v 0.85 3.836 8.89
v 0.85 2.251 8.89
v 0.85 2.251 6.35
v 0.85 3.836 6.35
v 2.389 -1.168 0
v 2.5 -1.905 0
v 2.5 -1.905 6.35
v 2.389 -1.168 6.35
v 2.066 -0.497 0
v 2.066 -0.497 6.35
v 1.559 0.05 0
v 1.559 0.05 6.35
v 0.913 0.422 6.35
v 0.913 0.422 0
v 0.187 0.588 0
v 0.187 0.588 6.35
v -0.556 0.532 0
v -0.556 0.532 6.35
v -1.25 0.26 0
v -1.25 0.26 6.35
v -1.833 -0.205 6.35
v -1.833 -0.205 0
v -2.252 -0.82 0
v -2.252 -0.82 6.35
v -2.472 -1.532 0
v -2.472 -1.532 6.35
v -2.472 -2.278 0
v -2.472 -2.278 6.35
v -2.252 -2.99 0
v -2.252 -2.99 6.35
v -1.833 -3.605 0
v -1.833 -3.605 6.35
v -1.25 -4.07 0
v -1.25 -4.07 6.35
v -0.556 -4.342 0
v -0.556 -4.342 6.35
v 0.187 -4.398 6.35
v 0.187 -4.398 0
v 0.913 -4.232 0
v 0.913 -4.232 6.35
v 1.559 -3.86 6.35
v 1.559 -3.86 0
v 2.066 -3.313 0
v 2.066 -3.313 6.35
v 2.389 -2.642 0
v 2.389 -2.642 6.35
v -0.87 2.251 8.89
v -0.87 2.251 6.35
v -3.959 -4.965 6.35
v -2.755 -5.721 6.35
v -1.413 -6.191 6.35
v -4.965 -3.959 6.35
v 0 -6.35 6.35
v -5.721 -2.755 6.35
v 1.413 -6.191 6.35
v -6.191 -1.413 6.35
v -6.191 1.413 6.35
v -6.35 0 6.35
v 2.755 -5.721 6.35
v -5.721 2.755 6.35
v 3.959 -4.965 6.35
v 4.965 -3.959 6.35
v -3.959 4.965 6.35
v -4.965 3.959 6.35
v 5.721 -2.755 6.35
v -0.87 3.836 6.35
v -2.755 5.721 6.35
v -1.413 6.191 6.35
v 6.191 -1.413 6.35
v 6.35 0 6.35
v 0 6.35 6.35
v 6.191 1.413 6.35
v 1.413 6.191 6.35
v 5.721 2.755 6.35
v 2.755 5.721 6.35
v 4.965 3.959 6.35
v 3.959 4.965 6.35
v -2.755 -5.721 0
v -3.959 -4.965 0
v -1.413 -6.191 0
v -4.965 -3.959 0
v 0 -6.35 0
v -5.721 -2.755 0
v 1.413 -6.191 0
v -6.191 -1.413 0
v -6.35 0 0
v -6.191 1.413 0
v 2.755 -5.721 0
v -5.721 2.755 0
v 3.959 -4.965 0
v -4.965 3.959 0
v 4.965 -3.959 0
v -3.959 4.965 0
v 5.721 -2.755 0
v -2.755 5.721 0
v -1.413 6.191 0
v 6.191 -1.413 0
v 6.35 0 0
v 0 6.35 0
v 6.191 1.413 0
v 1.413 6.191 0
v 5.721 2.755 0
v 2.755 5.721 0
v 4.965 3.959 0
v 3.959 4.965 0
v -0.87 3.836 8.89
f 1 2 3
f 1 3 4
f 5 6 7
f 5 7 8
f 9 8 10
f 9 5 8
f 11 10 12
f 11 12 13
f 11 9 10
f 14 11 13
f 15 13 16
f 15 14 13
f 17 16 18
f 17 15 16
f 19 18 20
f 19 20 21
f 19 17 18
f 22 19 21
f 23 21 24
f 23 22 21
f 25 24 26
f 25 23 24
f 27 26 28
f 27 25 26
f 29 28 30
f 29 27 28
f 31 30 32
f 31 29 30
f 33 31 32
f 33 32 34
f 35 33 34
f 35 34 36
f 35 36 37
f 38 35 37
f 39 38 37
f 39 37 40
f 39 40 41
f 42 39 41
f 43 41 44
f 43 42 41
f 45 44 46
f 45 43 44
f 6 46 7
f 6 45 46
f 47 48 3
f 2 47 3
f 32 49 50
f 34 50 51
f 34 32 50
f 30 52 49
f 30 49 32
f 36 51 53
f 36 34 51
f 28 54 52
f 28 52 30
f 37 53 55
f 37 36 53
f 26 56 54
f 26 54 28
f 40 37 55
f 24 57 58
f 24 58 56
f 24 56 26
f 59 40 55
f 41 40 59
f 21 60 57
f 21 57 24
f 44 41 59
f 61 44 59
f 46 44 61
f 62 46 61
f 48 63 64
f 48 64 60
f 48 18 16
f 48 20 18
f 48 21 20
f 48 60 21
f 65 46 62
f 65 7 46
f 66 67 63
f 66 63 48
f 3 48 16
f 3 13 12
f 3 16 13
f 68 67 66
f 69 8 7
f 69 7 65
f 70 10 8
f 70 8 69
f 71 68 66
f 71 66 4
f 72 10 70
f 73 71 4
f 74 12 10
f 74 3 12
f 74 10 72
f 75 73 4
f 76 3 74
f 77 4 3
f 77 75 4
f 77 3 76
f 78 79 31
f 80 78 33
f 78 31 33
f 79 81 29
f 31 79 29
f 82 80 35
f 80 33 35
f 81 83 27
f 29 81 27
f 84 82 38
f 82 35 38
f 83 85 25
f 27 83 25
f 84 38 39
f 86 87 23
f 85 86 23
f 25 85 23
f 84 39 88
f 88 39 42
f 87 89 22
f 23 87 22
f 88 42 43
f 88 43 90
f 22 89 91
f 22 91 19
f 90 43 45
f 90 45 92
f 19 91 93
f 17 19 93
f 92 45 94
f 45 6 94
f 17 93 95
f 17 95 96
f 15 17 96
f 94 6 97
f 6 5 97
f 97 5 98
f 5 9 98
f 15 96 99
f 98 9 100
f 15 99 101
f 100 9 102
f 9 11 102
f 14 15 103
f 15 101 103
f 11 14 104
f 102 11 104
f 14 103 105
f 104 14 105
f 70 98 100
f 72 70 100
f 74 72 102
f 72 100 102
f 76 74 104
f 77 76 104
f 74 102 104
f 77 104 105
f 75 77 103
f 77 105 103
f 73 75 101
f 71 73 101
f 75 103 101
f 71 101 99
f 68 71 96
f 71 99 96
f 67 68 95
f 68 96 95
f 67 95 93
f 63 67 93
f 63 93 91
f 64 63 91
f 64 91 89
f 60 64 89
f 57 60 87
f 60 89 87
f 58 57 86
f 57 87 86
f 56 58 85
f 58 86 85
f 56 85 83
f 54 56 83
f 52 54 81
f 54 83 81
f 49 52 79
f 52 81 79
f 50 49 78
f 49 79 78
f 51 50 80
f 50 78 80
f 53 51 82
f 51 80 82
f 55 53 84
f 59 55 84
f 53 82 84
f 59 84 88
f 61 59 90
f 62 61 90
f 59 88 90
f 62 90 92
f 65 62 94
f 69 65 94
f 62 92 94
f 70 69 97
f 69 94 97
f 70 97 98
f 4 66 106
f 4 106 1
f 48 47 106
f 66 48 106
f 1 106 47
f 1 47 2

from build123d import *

# Parameters (mm, degrees)
SKETCH1_R           = 6.35
SKETCH1_R_2         = 2.499995
BOSS_EXTRUDE1_DEPTH = 6.35
SKETCH2_W           = 1.71989263
SKETCH2_H           = 1.584620177
BOSS_EXTRUDE2_DEPTH = 2.54


with BuildPart() as part:
    # Sketch1 → Boss-Extrude1 (new body)
    with BuildSketch(Plane.XY):
        Circle(SKETCH1_R)
        with Locations((0, -1.905)):
            Circle(SKETCH1_R_2, mode=Mode.SUBTRACT)
    extrude(amount=BOSS_EXTRUDE1_DEPTH)

    # Sketch2 → Boss-Extrude2 (add)
    with BuildSketch(Plane.XY.offset(6.35)):
        with Locations((-0.009662318, 3.043630217)):
            Rectangle(SKETCH2_W, SKETCH2_H)
    extrude(amount=BOSS_EXTRUDE2_DEPTH)


solid = part.part
